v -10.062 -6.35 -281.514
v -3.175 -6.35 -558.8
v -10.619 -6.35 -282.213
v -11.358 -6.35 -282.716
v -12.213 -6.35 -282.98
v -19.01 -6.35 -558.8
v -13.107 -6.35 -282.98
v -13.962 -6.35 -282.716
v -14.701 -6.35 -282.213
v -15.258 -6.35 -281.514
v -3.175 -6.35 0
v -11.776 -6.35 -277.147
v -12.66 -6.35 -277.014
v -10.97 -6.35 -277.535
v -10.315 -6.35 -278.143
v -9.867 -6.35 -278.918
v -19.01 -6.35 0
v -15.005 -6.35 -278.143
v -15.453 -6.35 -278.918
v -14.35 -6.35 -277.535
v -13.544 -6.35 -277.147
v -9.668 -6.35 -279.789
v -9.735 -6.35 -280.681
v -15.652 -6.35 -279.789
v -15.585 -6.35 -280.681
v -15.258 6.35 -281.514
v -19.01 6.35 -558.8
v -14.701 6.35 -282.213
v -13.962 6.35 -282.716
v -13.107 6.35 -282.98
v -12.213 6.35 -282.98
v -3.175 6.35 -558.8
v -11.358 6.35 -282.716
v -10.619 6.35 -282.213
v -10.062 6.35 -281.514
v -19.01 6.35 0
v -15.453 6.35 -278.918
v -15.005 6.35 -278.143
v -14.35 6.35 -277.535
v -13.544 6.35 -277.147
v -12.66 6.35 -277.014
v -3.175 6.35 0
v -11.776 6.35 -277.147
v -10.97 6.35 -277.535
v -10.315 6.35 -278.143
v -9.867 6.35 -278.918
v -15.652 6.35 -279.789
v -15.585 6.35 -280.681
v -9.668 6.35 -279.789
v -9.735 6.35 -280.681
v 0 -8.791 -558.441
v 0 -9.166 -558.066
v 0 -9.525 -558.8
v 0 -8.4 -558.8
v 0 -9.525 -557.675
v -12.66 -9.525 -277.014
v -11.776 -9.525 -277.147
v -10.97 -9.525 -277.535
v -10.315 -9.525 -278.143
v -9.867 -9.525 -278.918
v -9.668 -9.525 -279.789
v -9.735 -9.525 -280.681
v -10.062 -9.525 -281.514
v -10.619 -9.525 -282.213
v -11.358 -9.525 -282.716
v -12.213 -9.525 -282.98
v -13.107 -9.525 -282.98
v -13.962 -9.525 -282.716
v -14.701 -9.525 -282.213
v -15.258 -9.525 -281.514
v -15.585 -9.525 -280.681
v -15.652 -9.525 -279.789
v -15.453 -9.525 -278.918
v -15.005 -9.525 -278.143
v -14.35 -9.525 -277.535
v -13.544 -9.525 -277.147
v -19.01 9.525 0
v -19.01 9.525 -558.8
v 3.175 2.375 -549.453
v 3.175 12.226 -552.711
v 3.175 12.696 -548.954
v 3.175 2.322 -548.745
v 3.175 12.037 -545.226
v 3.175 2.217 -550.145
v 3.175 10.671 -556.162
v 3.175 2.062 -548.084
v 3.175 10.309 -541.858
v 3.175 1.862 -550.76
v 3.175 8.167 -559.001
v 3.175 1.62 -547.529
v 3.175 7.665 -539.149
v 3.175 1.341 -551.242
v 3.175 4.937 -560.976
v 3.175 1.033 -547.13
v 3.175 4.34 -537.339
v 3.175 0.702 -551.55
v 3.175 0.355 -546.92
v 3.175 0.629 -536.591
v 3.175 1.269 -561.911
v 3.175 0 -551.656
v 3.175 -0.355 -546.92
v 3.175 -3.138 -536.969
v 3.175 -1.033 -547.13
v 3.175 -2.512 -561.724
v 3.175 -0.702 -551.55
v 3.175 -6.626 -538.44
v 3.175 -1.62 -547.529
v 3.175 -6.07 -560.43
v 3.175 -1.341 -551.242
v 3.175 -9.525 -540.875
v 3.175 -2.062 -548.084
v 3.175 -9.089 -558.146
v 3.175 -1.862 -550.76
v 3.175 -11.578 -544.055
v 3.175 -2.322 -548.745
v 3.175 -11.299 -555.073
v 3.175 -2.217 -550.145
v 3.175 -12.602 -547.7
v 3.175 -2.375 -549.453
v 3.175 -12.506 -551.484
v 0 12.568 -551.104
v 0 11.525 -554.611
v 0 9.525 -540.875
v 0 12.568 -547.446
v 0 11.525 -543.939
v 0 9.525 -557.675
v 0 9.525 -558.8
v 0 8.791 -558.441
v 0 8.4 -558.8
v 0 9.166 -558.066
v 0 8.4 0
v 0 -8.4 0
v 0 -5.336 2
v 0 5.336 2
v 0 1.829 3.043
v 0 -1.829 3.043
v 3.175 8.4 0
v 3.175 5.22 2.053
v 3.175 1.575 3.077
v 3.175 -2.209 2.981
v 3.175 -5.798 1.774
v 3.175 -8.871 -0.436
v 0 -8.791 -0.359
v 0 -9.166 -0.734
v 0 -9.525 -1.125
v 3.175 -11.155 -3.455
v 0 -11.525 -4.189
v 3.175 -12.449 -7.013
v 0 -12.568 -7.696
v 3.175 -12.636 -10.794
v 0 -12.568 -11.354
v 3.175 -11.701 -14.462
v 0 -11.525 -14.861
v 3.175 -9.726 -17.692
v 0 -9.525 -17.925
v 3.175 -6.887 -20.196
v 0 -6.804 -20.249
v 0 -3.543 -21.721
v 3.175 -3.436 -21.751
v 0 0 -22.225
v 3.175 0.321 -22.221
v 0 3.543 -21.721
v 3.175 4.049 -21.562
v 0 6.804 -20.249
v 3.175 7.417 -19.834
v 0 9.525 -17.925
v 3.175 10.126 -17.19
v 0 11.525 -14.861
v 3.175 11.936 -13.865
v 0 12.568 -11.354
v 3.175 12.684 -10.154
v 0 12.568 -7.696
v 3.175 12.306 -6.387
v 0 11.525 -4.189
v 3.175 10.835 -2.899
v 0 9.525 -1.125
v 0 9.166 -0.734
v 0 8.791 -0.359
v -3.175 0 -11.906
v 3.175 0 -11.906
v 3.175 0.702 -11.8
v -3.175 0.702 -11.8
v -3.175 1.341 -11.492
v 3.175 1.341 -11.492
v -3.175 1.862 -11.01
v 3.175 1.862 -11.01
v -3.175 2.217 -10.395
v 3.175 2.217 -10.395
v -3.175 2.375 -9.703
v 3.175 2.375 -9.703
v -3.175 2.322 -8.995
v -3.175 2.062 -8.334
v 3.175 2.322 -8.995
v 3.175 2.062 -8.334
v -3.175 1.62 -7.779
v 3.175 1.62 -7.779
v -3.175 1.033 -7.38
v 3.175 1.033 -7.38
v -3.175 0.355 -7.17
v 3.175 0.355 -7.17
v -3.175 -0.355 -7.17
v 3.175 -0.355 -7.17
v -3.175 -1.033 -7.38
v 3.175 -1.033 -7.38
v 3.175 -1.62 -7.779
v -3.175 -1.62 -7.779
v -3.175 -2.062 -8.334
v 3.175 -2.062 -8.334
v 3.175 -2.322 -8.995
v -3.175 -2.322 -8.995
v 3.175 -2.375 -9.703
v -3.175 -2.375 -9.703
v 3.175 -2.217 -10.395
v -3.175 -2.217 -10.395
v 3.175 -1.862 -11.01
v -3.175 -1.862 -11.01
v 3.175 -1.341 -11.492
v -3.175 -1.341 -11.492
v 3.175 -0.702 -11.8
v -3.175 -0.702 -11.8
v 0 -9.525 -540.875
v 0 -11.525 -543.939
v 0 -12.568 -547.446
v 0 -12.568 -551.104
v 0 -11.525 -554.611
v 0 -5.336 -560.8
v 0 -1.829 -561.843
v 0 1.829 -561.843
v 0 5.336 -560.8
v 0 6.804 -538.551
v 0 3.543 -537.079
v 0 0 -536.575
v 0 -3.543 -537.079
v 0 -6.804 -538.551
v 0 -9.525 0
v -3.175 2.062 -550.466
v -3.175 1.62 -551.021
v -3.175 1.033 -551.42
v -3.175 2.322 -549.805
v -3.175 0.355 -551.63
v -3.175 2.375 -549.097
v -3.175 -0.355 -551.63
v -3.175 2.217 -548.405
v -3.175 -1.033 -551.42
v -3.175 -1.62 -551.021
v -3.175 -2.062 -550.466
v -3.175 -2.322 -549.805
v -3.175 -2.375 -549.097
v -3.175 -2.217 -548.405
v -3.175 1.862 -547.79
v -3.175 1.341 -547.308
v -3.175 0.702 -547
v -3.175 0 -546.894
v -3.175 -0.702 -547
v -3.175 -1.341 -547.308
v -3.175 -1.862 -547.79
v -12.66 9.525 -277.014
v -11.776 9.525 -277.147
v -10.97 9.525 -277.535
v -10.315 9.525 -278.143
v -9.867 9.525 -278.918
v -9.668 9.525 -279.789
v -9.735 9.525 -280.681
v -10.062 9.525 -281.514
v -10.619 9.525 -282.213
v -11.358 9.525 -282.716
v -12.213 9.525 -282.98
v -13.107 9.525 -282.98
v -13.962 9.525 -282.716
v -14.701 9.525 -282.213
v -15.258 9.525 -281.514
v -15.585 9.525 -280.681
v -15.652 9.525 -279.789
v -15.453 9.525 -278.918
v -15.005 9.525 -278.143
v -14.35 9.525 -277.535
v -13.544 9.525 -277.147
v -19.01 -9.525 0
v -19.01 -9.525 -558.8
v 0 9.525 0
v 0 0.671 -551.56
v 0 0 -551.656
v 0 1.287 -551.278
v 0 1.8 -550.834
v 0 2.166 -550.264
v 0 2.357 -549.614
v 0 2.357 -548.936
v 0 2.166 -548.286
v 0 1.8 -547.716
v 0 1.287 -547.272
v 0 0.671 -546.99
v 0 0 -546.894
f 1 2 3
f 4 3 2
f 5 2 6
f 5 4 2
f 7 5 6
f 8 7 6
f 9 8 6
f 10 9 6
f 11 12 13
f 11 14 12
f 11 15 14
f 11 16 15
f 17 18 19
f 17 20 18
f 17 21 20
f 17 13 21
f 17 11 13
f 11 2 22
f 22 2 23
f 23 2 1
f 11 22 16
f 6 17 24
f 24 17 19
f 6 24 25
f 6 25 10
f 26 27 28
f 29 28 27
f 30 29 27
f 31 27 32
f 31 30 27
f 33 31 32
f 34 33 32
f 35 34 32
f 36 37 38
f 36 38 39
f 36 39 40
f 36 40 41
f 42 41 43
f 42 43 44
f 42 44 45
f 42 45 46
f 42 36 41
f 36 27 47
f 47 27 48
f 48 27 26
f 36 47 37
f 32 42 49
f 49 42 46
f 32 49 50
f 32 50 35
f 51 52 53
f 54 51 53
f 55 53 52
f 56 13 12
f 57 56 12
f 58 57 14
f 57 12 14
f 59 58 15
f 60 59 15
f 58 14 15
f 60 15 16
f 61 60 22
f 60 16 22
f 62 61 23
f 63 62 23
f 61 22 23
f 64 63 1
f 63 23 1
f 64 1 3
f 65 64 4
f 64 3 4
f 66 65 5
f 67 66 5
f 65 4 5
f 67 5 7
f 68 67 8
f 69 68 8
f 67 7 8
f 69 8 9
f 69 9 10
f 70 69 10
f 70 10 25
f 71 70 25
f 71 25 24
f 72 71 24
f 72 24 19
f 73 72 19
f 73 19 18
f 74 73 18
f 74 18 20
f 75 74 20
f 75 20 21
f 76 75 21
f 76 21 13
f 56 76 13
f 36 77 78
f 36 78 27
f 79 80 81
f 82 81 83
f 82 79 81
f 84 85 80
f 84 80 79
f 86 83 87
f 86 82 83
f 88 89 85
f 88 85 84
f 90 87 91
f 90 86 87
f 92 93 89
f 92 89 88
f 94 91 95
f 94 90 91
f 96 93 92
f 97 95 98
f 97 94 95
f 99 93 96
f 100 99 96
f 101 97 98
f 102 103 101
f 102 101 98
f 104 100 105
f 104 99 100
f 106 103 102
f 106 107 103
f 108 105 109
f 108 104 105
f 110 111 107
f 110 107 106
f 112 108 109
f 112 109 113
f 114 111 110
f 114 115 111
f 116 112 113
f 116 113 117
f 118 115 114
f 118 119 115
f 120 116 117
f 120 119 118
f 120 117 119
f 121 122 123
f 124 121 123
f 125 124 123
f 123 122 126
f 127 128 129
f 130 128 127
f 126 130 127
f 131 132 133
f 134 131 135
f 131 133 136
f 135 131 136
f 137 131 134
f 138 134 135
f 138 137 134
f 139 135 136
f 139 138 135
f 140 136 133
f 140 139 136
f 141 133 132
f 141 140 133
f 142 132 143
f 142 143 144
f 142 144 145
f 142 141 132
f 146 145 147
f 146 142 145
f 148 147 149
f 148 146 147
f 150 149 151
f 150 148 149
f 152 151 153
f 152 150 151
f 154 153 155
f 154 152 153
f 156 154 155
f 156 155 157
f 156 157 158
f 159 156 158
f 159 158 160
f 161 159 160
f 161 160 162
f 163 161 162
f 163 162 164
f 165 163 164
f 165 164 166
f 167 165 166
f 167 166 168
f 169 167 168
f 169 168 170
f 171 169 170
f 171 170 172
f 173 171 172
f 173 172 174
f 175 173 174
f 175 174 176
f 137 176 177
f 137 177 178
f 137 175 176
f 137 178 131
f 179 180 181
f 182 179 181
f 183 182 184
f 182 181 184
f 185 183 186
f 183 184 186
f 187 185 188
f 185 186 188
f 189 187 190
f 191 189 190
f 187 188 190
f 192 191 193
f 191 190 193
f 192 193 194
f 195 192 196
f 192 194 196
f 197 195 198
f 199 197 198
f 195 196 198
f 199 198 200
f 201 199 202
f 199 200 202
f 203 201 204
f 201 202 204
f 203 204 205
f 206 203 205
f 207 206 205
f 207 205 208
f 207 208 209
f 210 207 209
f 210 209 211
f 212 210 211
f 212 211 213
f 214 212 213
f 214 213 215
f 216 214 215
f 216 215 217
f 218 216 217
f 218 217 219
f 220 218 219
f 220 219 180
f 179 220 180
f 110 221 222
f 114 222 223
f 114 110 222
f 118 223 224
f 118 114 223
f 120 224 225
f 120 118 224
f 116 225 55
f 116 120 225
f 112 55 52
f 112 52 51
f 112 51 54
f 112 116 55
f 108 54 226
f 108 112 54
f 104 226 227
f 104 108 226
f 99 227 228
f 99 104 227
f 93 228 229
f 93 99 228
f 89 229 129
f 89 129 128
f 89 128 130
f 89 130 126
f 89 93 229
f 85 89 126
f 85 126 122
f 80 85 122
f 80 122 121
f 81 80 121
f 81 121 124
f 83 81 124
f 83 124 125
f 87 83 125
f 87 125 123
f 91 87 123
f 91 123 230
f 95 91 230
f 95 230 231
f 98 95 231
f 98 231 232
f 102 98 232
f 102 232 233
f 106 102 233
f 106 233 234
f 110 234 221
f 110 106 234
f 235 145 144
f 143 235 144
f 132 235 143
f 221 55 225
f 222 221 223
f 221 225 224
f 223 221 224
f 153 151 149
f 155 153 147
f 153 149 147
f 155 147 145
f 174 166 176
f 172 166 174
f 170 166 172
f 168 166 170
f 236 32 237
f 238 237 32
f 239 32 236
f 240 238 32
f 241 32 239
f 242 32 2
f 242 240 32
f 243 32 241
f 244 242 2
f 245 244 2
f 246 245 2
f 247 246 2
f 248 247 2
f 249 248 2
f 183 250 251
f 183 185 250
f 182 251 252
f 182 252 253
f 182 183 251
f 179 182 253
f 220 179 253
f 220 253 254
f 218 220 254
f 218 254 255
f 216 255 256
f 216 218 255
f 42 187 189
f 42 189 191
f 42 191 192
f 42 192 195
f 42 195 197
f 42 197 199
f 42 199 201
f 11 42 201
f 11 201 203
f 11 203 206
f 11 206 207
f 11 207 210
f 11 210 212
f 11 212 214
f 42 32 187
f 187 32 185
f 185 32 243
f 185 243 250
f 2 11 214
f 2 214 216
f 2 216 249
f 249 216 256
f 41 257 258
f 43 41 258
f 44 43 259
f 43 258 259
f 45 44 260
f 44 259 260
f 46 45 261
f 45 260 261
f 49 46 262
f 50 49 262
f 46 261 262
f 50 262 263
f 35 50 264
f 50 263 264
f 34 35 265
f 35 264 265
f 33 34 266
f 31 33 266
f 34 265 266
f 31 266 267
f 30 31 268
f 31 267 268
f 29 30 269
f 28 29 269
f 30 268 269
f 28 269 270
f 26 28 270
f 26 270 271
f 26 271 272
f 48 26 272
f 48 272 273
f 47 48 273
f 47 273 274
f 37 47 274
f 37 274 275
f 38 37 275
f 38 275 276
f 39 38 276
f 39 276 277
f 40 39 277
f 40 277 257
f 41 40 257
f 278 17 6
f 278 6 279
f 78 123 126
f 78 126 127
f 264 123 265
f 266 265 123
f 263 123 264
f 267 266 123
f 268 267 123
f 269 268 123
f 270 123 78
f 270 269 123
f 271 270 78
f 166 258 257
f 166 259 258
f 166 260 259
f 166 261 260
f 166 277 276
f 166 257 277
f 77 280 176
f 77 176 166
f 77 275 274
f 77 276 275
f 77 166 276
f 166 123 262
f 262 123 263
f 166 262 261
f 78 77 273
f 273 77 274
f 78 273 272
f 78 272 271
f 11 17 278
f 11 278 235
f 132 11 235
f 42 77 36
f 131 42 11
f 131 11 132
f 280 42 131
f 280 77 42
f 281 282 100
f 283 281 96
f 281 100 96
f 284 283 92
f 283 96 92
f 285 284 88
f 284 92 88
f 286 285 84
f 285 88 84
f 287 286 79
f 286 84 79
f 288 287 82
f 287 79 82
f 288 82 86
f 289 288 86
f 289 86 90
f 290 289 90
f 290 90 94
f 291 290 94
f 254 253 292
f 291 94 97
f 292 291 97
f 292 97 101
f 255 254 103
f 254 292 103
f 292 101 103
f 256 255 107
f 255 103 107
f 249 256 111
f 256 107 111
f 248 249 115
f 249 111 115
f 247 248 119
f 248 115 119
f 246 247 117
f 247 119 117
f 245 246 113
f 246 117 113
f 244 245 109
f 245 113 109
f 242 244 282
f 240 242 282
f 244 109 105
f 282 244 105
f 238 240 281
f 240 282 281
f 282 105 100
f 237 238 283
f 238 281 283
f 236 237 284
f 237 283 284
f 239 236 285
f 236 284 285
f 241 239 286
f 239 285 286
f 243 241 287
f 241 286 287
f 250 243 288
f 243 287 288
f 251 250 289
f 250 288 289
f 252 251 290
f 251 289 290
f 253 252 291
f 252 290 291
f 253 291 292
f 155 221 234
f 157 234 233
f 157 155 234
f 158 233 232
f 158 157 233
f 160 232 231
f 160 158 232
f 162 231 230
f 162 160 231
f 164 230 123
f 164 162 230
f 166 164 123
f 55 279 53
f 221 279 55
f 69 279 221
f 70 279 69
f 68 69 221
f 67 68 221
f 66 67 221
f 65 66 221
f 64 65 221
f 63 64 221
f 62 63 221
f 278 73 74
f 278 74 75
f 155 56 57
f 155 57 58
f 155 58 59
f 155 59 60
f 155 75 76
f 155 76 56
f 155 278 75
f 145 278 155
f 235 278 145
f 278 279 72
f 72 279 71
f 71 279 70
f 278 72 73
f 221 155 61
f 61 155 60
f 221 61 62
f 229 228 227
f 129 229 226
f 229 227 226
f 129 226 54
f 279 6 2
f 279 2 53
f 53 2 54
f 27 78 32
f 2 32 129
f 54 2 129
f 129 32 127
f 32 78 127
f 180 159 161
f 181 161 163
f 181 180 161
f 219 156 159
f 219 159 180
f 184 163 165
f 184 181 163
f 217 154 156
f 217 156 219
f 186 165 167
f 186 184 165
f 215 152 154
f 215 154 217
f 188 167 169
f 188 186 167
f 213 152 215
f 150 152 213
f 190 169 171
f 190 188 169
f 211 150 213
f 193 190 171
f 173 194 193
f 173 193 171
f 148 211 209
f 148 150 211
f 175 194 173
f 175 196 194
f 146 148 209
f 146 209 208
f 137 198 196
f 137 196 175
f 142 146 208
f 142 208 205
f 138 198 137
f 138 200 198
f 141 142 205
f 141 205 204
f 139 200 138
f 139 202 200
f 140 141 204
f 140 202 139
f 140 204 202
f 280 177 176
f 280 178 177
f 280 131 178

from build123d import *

# Parameters (mm, degrees)
BOSS_EXTRUDE1_DEPTH = 558.8
SKETCH2_R           = 3
CUT_EXTRUDE1_DEPTH  = 558.8
SKETCH4_R           = 2.38125
CUT_EXTRUDE8_DEPTH  = 6.8
BOSS_EXTRUDE3_START = 3.175
SKETCH5_R           = 12.7
SKETCH5_R_2         = 2.38125
BOSS_EXTRUDE3_DEPTH = 3.175


with BuildPart() as part:
    # Sketch1 → Boss-Extrude1 (new body)
    with BuildSketch(Plane.XY):
        Polygon((0, -9.525), (0, 9.525), (-19.01, 9.525), (-19.01, 6.35), (-3.175, 6.35), (-3.175, -6.35), (-19.01, -6.35), (-19.01, -9.525), align=None)
    extrude(amount=-BOSS_EXTRUDE1_DEPTH)

    # Sketch2 → Cut-Extrude1 (cut)
    with BuildSketch(Plane(origin=(0, 9.525, 0), x_dir=(1, 0, 0), z_dir=(0, 1, 0))):
        with Locations(Location((-12.66, 280.013576808, 0), (0, 0, 270))):
            Circle(SKETCH2_R)
    extrude(amount=-CUT_EXTRUDE1_DEPTH, mode=Mode.SUBTRACT)

    # Sketch4 → Cut-Extrude8 (cut)
    with BuildSketch(Plane(origin=(0, 0, 0), x_dir=(0, 0, -1), z_dir=(1, 0, 0))):
        with Locations((9.525, 0)):
            Circle(SKETCH4_R)
        with Locations(Location((549.275, 0, 0), (0, 0, 180))):
            Circle(SKETCH4_R)
    extrude(amount=-CUT_EXTRUDE8_DEPTH, mode=Mode.SUBTRACT)

    # Sketch5 → Boss-Extrude3 (add)
    # profile 1 of 2: a face of its own
    with BuildSketch(Plane(origin=(0, 0, 0), x_dir=(0, 0, -1), z_dir=(1, 0, 0)).offset(BOSS_EXTRUDE3_START)):
        with Locations(Location((9.525, 0, 0), (0, 0, 138.590377891))):
            Circle(SKETCH5_R)
        with Locations((9.525, 0)):
            Circle(SKETCH5_R_2, mode=Mode.SUBTRACT)
    # profile 2 of 2: a face of its own
    with BuildSketch(Plane(origin=(0, 0, 0), x_dir=(0, 0, -1), z_dir=(1, 0, 0)).offset(BOSS_EXTRUDE3_START)):
        with Locations(Location((549.275, 0, 0), (0, 0, 228.590377891))):
            Circle(SKETCH5_R)
        with Locations((549.275, 0)):
            Circle(SKETCH5_R_2, mode=Mode.SUBTRACT)
    extrude(amount=-BOSS_EXTRUDE3_DEPTH)


solid = part.part
